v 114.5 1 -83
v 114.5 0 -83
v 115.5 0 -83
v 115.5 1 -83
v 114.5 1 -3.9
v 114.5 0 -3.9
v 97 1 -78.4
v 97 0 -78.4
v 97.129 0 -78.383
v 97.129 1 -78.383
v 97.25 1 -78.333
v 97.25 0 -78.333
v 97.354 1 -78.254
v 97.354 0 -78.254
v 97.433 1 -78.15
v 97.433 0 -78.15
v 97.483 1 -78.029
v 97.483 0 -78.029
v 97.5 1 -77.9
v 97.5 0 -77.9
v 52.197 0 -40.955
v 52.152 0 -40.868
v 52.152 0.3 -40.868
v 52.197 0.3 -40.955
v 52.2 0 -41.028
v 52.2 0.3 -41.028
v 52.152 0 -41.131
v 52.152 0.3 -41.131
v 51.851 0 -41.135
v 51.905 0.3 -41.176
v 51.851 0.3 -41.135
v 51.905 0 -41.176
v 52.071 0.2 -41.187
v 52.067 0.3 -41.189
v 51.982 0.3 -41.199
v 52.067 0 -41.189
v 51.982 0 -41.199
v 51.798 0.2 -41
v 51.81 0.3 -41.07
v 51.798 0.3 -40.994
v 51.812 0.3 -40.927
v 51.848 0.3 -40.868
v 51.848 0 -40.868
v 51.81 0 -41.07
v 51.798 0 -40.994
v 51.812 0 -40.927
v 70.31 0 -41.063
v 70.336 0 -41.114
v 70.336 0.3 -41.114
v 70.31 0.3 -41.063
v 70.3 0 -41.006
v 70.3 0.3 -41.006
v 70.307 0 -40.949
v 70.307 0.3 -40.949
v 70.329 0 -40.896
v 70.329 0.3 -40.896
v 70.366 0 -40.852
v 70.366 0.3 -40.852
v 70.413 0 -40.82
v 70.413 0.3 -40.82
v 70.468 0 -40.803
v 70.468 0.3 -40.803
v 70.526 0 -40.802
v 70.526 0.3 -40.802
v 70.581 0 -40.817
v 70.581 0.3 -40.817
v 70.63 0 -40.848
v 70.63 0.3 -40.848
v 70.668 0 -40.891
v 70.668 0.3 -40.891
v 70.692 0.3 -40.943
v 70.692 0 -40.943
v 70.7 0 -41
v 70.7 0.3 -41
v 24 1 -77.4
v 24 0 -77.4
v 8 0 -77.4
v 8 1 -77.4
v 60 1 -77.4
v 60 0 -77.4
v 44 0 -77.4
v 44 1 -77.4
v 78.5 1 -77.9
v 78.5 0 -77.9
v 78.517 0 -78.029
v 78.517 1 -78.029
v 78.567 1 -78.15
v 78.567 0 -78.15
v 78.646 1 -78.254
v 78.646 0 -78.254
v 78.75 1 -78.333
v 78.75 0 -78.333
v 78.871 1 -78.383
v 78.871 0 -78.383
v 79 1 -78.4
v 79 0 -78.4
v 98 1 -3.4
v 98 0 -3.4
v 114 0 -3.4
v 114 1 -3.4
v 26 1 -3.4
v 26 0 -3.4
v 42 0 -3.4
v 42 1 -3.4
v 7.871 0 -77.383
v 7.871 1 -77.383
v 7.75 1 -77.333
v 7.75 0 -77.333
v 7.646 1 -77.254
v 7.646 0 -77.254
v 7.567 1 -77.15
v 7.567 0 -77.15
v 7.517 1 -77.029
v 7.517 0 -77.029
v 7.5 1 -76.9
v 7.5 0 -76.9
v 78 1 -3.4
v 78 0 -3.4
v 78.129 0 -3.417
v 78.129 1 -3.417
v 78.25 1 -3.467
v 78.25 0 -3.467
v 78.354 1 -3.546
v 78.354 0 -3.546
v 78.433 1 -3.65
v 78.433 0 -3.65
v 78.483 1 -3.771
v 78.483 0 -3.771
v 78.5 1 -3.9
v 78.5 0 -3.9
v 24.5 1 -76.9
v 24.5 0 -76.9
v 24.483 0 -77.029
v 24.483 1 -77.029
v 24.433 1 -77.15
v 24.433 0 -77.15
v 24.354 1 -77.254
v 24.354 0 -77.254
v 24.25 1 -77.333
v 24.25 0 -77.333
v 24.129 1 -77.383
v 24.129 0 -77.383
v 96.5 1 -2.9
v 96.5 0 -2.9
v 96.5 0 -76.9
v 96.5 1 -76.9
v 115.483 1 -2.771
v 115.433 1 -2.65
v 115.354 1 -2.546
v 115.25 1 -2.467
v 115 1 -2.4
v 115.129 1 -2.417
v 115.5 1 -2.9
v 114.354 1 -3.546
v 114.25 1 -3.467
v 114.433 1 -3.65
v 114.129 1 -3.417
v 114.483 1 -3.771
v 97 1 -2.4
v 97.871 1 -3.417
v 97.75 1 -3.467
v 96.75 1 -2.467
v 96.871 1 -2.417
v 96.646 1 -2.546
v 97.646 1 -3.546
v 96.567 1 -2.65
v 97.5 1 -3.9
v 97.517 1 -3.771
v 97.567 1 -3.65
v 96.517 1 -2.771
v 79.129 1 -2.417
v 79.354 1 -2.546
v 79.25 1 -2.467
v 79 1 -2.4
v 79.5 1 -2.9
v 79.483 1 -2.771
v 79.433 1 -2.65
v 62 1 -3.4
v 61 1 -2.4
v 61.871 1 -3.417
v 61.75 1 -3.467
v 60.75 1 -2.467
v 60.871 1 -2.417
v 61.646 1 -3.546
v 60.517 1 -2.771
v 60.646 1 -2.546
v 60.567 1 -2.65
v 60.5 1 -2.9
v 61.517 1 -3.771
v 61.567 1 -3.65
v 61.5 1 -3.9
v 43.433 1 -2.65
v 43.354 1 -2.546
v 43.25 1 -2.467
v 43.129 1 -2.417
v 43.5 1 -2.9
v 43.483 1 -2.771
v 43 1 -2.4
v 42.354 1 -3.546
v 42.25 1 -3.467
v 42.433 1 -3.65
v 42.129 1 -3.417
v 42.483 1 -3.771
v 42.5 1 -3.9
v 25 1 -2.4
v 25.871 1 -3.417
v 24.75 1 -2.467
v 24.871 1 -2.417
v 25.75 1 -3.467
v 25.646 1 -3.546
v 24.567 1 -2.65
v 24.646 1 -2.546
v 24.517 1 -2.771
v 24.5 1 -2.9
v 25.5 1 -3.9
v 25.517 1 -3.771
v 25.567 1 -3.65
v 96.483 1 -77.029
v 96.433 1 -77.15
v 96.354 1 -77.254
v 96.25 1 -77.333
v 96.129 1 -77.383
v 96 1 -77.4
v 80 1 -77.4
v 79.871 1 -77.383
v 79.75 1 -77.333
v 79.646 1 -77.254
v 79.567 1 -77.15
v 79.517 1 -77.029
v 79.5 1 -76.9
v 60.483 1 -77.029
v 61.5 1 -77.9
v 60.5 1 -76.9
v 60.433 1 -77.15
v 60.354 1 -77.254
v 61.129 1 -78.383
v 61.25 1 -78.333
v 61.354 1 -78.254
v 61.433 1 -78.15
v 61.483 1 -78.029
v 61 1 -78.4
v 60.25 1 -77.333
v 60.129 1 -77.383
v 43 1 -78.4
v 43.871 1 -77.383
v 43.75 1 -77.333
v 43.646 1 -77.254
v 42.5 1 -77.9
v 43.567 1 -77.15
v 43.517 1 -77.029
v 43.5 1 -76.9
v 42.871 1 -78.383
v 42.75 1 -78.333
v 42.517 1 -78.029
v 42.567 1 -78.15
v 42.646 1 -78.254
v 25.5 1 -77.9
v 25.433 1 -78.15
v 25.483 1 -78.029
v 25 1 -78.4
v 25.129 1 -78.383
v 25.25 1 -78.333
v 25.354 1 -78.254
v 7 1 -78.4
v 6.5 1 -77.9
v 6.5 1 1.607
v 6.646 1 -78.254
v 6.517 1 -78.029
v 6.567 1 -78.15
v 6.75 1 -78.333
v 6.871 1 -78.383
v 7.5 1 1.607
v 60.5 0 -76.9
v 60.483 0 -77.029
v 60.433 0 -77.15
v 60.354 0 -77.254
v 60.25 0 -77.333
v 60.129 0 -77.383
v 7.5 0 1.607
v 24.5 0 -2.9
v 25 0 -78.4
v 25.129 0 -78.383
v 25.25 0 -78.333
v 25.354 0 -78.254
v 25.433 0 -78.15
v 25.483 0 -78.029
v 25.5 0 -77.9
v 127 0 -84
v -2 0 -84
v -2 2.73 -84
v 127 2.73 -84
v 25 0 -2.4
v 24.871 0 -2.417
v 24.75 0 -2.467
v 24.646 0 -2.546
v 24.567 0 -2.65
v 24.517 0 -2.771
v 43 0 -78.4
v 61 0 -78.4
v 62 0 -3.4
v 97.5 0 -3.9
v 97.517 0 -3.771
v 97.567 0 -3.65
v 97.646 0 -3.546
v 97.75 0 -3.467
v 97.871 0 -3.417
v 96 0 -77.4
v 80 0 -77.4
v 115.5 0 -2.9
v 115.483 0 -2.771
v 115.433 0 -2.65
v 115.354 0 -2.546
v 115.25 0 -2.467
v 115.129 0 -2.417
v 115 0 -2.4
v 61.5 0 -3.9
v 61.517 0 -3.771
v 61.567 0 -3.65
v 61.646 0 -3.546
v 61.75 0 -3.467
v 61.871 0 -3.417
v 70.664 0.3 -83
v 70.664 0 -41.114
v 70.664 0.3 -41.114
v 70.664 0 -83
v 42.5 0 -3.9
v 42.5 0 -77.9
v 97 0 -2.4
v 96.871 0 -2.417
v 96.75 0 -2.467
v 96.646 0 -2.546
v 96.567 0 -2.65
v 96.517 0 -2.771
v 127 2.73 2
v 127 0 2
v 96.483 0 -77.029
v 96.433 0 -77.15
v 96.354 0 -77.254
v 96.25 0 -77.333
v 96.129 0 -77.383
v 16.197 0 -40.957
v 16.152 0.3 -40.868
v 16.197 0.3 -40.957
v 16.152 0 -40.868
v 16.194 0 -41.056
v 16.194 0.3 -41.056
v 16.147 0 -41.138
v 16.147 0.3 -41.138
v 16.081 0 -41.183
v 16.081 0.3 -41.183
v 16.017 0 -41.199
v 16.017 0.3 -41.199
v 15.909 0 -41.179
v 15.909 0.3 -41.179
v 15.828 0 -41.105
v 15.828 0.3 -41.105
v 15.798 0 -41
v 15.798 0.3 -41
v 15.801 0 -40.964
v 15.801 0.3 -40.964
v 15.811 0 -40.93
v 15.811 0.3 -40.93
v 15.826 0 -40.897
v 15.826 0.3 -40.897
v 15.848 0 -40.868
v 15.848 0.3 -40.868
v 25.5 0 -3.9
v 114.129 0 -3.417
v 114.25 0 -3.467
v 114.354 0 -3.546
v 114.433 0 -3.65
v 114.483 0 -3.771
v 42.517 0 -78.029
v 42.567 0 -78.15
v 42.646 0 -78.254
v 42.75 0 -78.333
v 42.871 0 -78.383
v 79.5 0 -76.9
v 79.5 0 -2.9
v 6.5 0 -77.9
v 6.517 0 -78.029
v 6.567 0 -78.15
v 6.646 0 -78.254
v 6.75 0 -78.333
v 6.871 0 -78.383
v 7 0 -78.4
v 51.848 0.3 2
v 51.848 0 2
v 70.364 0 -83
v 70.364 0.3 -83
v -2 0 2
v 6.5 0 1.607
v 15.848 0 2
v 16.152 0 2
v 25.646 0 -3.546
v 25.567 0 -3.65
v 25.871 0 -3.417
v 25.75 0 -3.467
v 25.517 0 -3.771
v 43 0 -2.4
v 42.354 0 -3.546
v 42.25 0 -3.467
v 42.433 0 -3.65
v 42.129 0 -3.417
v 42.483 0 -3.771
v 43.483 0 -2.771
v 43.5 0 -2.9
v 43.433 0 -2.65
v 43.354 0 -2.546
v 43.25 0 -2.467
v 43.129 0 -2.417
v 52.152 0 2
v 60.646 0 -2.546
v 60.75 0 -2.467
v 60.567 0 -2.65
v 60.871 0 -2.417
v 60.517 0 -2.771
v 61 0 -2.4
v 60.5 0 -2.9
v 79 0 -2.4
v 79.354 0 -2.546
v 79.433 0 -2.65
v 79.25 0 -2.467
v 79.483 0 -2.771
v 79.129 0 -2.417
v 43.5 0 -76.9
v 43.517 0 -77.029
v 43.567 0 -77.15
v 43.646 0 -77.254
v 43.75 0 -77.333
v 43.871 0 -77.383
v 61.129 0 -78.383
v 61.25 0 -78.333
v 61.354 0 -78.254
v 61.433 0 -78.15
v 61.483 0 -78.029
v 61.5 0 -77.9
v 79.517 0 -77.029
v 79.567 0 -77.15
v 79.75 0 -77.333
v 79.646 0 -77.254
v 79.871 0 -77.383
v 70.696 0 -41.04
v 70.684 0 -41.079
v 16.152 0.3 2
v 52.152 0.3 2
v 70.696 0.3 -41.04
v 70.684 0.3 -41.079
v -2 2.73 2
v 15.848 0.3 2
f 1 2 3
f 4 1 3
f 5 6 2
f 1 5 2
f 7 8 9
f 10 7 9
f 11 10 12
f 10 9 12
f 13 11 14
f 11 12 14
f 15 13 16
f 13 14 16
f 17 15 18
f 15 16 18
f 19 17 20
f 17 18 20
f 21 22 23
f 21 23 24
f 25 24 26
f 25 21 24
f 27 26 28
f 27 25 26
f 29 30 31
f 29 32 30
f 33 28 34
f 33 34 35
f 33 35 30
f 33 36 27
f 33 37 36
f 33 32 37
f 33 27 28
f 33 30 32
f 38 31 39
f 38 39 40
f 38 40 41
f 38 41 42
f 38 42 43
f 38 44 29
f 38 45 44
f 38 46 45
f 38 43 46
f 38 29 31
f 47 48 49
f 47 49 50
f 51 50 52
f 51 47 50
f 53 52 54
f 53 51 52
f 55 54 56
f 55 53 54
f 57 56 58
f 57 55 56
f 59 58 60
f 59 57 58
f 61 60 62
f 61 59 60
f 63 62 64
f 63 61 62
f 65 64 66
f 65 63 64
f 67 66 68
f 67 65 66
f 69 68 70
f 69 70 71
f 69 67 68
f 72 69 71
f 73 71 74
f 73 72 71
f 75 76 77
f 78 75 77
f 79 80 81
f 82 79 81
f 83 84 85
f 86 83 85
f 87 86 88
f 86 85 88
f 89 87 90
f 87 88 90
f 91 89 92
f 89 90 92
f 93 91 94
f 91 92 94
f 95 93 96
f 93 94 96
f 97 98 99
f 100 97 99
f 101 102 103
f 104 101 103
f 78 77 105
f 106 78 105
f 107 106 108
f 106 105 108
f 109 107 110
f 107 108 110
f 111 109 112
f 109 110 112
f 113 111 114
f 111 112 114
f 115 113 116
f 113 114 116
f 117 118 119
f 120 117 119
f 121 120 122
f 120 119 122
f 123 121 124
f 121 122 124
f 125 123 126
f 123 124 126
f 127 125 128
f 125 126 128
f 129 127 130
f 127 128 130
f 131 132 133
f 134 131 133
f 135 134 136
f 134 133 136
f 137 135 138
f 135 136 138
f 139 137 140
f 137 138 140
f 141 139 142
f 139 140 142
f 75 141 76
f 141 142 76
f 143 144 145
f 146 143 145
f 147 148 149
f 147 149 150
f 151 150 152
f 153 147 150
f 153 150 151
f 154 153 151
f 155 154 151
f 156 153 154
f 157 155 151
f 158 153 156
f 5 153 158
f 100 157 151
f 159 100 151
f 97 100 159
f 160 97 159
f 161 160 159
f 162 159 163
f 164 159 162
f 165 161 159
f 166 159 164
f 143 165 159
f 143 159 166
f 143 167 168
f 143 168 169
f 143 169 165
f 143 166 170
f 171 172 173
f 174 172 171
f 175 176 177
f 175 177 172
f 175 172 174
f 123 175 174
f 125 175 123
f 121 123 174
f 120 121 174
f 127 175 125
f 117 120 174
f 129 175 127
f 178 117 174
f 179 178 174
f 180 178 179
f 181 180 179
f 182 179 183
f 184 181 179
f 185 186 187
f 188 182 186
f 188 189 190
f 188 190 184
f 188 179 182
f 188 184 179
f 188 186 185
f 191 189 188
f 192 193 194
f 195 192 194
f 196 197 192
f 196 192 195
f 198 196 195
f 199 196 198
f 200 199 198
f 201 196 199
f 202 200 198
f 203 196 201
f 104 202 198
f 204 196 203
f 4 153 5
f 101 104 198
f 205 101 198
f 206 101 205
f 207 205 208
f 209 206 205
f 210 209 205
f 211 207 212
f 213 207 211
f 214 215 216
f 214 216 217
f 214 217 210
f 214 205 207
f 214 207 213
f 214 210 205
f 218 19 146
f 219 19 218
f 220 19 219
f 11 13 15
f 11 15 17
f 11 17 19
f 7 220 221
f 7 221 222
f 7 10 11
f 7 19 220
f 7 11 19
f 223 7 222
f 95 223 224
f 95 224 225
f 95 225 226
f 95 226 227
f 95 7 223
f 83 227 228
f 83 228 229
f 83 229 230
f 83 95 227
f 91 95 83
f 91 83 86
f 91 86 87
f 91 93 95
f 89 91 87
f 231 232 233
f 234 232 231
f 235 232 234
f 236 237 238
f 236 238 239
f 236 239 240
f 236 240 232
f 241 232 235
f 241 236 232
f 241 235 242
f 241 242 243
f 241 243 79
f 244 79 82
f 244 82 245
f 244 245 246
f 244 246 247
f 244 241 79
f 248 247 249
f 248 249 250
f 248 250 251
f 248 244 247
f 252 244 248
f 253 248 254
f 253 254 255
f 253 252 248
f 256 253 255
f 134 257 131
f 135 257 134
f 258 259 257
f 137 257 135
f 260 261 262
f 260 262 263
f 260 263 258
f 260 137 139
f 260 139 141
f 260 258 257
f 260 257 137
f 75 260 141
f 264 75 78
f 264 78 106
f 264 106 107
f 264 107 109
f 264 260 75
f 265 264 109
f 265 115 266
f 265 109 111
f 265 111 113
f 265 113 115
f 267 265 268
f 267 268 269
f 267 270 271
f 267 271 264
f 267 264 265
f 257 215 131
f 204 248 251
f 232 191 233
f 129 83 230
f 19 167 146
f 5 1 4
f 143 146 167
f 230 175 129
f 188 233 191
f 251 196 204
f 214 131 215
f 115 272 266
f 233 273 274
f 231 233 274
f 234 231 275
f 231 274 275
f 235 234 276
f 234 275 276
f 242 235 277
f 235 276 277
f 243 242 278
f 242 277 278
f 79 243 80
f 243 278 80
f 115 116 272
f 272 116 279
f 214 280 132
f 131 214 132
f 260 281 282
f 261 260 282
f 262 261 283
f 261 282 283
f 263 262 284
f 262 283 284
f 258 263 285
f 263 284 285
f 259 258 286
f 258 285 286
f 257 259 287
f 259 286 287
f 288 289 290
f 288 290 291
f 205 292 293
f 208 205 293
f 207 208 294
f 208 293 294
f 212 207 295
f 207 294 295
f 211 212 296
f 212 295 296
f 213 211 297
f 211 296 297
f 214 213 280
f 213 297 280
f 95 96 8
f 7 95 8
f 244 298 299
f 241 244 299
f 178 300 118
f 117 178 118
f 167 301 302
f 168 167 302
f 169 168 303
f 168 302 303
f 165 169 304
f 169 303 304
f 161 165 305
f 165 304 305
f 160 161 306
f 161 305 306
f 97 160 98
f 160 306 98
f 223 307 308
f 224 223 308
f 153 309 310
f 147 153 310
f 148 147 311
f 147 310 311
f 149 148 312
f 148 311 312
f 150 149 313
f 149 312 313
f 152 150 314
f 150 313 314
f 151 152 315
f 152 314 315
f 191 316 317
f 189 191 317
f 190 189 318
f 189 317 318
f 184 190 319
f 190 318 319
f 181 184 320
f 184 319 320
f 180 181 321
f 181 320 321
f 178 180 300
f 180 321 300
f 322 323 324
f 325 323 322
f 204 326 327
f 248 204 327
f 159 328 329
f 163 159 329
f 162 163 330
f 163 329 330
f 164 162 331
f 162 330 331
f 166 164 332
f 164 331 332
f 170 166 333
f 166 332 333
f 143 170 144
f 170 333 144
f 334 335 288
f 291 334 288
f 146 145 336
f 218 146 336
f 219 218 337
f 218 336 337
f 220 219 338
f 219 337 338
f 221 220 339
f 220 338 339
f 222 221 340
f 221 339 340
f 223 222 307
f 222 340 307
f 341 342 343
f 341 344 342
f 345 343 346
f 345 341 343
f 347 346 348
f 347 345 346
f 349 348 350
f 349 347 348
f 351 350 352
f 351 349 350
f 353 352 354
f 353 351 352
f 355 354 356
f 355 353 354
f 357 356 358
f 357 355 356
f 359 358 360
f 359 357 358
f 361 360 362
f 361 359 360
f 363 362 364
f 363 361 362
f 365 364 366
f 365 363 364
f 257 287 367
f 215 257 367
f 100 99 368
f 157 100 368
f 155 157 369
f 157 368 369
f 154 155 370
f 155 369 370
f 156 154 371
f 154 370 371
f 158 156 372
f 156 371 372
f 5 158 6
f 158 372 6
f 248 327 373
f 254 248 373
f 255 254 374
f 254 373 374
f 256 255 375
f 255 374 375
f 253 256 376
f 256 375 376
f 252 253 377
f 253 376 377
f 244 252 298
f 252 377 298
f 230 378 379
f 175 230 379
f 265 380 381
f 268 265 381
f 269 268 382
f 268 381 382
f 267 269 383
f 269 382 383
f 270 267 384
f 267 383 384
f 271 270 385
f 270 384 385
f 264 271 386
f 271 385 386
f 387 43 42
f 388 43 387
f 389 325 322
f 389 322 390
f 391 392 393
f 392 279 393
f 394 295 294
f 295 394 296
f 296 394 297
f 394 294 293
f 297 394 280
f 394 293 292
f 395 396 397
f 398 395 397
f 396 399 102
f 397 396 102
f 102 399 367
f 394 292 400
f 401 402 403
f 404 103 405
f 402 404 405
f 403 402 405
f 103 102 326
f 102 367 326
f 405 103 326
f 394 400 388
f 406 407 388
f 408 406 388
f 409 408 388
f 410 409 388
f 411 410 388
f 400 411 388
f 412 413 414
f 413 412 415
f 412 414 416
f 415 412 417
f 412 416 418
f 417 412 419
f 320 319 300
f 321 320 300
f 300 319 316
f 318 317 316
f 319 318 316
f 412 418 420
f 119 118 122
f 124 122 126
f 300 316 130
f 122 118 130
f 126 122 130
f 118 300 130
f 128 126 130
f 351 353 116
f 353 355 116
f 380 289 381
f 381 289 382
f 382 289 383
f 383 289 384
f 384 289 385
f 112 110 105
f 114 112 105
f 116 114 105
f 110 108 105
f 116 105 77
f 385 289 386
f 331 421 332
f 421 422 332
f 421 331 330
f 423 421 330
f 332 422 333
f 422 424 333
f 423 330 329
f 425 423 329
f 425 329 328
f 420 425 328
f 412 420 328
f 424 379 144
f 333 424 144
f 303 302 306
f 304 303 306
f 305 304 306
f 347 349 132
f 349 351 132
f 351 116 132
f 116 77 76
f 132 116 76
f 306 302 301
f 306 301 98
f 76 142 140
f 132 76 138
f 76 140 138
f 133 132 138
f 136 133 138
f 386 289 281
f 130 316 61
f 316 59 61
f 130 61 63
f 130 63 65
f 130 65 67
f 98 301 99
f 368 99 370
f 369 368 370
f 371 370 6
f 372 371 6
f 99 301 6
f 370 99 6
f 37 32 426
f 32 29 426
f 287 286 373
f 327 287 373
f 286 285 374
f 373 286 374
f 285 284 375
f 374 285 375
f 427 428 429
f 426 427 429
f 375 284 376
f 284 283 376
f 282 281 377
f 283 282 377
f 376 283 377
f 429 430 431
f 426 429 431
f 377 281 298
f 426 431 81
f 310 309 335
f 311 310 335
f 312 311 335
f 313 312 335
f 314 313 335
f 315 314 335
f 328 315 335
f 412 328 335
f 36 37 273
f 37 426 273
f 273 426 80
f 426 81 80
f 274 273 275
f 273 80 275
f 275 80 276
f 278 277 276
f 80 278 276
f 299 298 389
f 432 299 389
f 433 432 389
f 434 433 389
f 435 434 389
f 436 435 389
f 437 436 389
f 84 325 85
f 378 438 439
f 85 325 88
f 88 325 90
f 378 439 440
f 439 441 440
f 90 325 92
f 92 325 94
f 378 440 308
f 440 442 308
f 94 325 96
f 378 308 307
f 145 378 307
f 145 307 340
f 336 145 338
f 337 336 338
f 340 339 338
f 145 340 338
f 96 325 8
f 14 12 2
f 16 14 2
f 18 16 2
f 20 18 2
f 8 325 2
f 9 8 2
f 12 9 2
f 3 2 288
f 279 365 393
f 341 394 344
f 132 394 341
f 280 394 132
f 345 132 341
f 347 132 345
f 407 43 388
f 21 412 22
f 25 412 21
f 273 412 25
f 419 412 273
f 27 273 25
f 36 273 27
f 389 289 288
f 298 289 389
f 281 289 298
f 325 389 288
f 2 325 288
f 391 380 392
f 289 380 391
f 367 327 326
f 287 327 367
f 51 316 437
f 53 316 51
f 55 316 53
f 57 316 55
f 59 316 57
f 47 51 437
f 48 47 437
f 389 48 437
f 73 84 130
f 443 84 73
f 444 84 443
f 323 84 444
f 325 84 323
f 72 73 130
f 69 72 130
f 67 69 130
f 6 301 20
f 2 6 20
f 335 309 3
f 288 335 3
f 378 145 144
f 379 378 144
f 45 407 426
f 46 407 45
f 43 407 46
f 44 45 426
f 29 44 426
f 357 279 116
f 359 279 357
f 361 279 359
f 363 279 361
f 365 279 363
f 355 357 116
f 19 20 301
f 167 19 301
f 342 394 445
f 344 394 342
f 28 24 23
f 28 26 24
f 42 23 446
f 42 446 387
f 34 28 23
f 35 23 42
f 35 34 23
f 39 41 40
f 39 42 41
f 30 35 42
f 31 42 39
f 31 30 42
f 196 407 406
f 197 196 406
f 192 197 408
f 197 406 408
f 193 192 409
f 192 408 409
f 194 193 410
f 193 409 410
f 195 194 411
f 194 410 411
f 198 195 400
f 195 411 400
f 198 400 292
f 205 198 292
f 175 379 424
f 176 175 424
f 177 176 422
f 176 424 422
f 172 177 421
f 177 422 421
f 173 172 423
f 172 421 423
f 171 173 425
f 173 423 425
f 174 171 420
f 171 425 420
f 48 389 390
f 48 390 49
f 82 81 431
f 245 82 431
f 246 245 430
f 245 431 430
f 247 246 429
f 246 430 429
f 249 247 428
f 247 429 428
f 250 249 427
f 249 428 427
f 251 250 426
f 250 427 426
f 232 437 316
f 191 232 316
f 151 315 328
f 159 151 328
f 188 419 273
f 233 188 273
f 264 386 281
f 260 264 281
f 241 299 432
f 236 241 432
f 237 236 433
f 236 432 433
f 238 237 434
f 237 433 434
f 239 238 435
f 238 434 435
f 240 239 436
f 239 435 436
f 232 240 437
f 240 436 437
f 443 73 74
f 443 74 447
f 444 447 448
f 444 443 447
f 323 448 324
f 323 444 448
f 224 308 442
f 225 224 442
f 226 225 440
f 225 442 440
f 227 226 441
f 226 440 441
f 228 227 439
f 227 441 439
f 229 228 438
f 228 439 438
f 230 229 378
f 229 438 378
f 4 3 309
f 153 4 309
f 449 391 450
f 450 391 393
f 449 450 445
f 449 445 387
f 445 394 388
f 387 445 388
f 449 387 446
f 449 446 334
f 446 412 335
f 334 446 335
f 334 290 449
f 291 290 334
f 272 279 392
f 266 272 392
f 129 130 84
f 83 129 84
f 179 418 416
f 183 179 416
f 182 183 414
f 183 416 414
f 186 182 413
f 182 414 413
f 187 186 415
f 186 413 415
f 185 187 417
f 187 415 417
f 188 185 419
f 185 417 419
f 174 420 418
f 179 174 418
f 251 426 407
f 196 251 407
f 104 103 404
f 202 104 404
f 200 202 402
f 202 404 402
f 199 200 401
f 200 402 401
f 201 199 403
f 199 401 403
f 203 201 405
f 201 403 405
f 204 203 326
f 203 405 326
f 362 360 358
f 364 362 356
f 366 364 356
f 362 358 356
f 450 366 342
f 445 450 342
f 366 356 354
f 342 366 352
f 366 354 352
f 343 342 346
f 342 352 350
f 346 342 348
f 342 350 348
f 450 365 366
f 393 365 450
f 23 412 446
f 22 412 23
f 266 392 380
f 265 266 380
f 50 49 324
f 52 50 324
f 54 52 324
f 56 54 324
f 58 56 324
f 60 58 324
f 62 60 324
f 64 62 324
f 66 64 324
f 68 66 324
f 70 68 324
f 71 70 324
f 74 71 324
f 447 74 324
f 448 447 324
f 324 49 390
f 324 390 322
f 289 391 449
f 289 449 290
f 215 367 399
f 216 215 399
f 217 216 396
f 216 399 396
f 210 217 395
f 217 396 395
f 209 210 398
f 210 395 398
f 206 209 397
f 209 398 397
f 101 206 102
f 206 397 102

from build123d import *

# Parameters (mm, degrees)
SKETCH_1_W             = 129
SKETCH_1_H             = 86
EXTRUDE_2_DEPTH        = 2.73
CUT_EXTRUDE_1507_DEPTH = 1
SKETCH_1_7_RX          = 0.202164981
SKETCH_1_7_RY          = 0.2
CUT_EXTRUDE_5_DEPTH    = 0.3
CUT_EXTRUDE_15_DEPTH   = 0.3


with BuildPart() as part:
    # Эскиз1 → Бобышка-Вытянуть2 (new body)
    with BuildSketch(Plane(origin=(0, 0, 0), x_dir=(1, 0, 0), z_dir=(0, 1, 0))):
        with Locations((62.5, 41)):
            Rectangle(SKETCH_1_W, SKETCH_1_H)
    extrude(amount=EXTRUDE_2_DEPTH)

    # Эскиз1<4> → Cut-Extrude 1507 (cut)
    with BuildSketch(Plane(origin=(0, 0, 0), x_dir=(1, 0, 0), z_dir=(0, 1, 0))):
        with BuildLine():
            Line((6.5, -1.607315502), (6.5, 77.9))
            ThreePointArc((6.5, 77.9), (6.646446609, 78.253553391), (7, 78.4))
            Line((7, 78.4), (25, 78.4))
            ThreePointArc((25, 78.4), (25.353553391, 78.253553391), (25.5, 77.9))
            Line((25.5, 77.9), (25.5, 3.9))
            ThreePointArc((25.5, 3.9), (25.646446609, 3.546446609), (26, 3.4))
            Line((26, 3.4), (42, 3.4))
            ThreePointArc((42, 3.4), (42.353553391, 3.546446609), (42.5, 3.9))
            Line((42.5, 3.9), (42.5, 77.9))
            ThreePointArc((42.5, 77.9), (42.646446609, 78.253553391), (43, 78.4))
            Line((43, 78.4), (61, 78.4))
            ThreePointArc((61, 78.4), (61.353553391, 78.253553391), (61.5, 77.9))
            Line((61.5, 77.9), (61.5, 3.9))
            ThreePointArc((61.5, 3.9), (61.646446609, 3.546446609), (62, 3.4))
            Line((62, 3.4), (78, 3.4))
            ThreePointArc((78, 3.4), (78.353553391, 3.546446609), (78.5, 3.9))
            Line((78.5, 3.9), (78.5, 77.9))
            ThreePointArc((78.5, 77.9), (78.646446609, 78.253553391), (79, 78.4))
            Line((79, 78.4), (97, 78.4))
            ThreePointArc((97, 78.4), (97.353553391, 78.253553391), (97.5, 77.9))
            Line((97.5, 77.9), (97.5, 3.9))
            ThreePointArc((97.5, 3.9), (97.646446609, 3.546446609), (98, 3.4))
            Line((98, 3.4), (114, 3.4))
            ThreePointArc((114, 3.4), (114.353553391, 3.546446609), (114.5, 3.9))
            Line((114.5, 3.9), (114.5, 78.4))
            Line((114.5, 78.4), (114.5, 83))
            Line((114.5, 83), (115.5, 83))
            Line((115.5, 83), (115.5, 77.4))
            Line((115.5, 77.4), (115.5, 2.9))
            ThreePointArc((115.5, 2.9), (115.353553391, 2.546446609), (115, 2.4))
            Line((115, 2.4), (97, 2.4))
            ThreePointArc((97, 2.4), (96.646446609, 2.546446609), (96.5, 2.9))
            Line((96.5, 2.9), (96.5, 76.9))
            ThreePointArc((96.5, 76.9), (96.353553391, 77.253553391), (96, 77.4))
            Line((96, 77.4), (80, 77.4))
            ThreePointArc((80, 77.4), (79.646446609, 77.253553391), (79.5, 76.9))
            Line((79.5, 76.9), (79.5, 2.9))
            ThreePointArc((79.5, 2.9), (79.353553391, 2.546446609), (79, 2.4))
            Line((79, 2.4), (61, 2.4))
            ThreePointArc((61, 2.4), (60.646446609, 2.546446609), (60.5, 2.9))
            Line((60.5, 2.9), (60.5, 76.9))
            ThreePointArc((60.5, 76.9), (60.353553391, 77.253553391), (60, 77.4))
            Line((60, 77.4), (44, 77.4))
            ThreePointArc((44, 77.4), (43.646446609, 77.253553391), (43.5, 76.9))
            Line((43.5, 76.9), (43.5, 2.9))
            ThreePointArc((43.5, 2.9), (43.353553391, 2.546446609), (43, 2.4))
            Line((43, 2.4), (25, 2.4))
            ThreePointArc((25, 2.4), (24.646446609, 2.546446609), (24.5, 2.9))
            Line((24.5, 2.9), (24.5, 76.9))
            ThreePointArc((24.5, 76.9), (24.353553391, 77.253553391), (24, 77.4))
            Line((24, 77.4), (8, 77.4))
            ThreePointArc((8, 77.4), (7.646446609, 77.253553391), (7.5, 76.9))
            Line((7.5, 76.9), (7.5, -1.607315502))
            Line((7.5, -1.607315502), (6.5, -1.607315502))
        make_face()
    extrude(amount=CUT_EXTRUDE_1507_DEPTH, mode=Mode.SUBTRACT)

    # Эскиз1<7> → Вырез-Вытянуть5 (cut)
    with BuildSketch(Plane(origin=(0, 0, 0), x_dir=(1, 0, 0), z_dir=(0, 1, 0))):
        with Locations(Location((16, 41), (0, 0, 180))):
            Ellipse(SKETCH_1_7_RX, SKETCH_1_7_RY)
    extrude(amount=CUT_EXTRUDE_5_DEPTH, mode=Mode.SUBTRACT)

    # Эскиз9 → Вырез-Вытянуть15 (cut)
    with BuildSketch(Plane(origin=(0, 0, 0), x_dir=(1, 0, 0), z_dir=(0, 1, 0))):
        with BuildLine():
            Line((15.847835019, 40.868322065), (15.847835019, -2))
            Line((15.847835019, -2), (16.152164981, -2))
            Line((16.152164981, -2), (16.152164981, 40.868322065))
            add(Edge.make_bspline(
                [(16.152164981, 40.868322065), (16.344349714, 41.085676609), (16.071092366, 41.187225919), (15.797835019, 41.288775229), (15.797835019, 41)],
                knots=[2.422915364, 2.422915364, 2.422915364, 4.353050335, 4.353050335, 6.283185307, 6.283185307, 6.283185307], degree=2, weights=[1, 0.569361398, 1, 0.569361398, 1]))
            add(Edge.make_bspline(
                [(15.797835019, 41), (15.797835019, 40.924870403), (15.847835019, 40.868322065)],
                knots=[0, 0, 0, 0.71867729, 0.71867729, 0.71867729], degree=2, weights=[1, 0.936129597, 1]))
        make_face()
        with BuildLine():
            Line((70.664301479, 83), (70.364301479, 83))
            Line((70.364301479, 83), (70.335776261, 41.114151494))
            ThreePointArc((70.335776261, 41.114151494), (70.499931864, 40.800000012), (70.664301479, 41.114039572))
            Line((70.664301479, 41.114039572), (70.664301479, 83))
        make_face()
        with BuildLine():
            add(Edge.make_bspline(
                [(51.797835019, 41), (51.797835019, 40.924870403), (51.847835019, 40.868322065)],
                knots=[0, 0, 0, 0.71867729, 0.71867729, 0.71867729], degree=2, weights=[1, 0.936129597, 1]))
            Line((51.847835019, 40.868322065), (51.847835019, -2))
            Line((51.847835019, -2), (52.152164981, -2))
            Line((52.152164981, -2), (52.152164981, 40.868322065))
            add(Edge.make_bspline(
                [(52.152164981, 40.868322065), (52.344349714, 41.085676609), (52.071092366, 41.187225919), (51.797835019, 41.288775229), (51.797835019, 41)],
                knots=[2.422915364, 2.422915364, 2.422915364, 4.353050335, 4.353050335, 6.283185307, 6.283185307, 6.283185307], degree=2, weights=[1, 0.569361398, 1, 0.569361398, 1]))
        make_face()
    extrude(amount=CUT_EXTRUDE_15_DEPTH, mode=Mode.SUBTRACT)


solid = part.part
